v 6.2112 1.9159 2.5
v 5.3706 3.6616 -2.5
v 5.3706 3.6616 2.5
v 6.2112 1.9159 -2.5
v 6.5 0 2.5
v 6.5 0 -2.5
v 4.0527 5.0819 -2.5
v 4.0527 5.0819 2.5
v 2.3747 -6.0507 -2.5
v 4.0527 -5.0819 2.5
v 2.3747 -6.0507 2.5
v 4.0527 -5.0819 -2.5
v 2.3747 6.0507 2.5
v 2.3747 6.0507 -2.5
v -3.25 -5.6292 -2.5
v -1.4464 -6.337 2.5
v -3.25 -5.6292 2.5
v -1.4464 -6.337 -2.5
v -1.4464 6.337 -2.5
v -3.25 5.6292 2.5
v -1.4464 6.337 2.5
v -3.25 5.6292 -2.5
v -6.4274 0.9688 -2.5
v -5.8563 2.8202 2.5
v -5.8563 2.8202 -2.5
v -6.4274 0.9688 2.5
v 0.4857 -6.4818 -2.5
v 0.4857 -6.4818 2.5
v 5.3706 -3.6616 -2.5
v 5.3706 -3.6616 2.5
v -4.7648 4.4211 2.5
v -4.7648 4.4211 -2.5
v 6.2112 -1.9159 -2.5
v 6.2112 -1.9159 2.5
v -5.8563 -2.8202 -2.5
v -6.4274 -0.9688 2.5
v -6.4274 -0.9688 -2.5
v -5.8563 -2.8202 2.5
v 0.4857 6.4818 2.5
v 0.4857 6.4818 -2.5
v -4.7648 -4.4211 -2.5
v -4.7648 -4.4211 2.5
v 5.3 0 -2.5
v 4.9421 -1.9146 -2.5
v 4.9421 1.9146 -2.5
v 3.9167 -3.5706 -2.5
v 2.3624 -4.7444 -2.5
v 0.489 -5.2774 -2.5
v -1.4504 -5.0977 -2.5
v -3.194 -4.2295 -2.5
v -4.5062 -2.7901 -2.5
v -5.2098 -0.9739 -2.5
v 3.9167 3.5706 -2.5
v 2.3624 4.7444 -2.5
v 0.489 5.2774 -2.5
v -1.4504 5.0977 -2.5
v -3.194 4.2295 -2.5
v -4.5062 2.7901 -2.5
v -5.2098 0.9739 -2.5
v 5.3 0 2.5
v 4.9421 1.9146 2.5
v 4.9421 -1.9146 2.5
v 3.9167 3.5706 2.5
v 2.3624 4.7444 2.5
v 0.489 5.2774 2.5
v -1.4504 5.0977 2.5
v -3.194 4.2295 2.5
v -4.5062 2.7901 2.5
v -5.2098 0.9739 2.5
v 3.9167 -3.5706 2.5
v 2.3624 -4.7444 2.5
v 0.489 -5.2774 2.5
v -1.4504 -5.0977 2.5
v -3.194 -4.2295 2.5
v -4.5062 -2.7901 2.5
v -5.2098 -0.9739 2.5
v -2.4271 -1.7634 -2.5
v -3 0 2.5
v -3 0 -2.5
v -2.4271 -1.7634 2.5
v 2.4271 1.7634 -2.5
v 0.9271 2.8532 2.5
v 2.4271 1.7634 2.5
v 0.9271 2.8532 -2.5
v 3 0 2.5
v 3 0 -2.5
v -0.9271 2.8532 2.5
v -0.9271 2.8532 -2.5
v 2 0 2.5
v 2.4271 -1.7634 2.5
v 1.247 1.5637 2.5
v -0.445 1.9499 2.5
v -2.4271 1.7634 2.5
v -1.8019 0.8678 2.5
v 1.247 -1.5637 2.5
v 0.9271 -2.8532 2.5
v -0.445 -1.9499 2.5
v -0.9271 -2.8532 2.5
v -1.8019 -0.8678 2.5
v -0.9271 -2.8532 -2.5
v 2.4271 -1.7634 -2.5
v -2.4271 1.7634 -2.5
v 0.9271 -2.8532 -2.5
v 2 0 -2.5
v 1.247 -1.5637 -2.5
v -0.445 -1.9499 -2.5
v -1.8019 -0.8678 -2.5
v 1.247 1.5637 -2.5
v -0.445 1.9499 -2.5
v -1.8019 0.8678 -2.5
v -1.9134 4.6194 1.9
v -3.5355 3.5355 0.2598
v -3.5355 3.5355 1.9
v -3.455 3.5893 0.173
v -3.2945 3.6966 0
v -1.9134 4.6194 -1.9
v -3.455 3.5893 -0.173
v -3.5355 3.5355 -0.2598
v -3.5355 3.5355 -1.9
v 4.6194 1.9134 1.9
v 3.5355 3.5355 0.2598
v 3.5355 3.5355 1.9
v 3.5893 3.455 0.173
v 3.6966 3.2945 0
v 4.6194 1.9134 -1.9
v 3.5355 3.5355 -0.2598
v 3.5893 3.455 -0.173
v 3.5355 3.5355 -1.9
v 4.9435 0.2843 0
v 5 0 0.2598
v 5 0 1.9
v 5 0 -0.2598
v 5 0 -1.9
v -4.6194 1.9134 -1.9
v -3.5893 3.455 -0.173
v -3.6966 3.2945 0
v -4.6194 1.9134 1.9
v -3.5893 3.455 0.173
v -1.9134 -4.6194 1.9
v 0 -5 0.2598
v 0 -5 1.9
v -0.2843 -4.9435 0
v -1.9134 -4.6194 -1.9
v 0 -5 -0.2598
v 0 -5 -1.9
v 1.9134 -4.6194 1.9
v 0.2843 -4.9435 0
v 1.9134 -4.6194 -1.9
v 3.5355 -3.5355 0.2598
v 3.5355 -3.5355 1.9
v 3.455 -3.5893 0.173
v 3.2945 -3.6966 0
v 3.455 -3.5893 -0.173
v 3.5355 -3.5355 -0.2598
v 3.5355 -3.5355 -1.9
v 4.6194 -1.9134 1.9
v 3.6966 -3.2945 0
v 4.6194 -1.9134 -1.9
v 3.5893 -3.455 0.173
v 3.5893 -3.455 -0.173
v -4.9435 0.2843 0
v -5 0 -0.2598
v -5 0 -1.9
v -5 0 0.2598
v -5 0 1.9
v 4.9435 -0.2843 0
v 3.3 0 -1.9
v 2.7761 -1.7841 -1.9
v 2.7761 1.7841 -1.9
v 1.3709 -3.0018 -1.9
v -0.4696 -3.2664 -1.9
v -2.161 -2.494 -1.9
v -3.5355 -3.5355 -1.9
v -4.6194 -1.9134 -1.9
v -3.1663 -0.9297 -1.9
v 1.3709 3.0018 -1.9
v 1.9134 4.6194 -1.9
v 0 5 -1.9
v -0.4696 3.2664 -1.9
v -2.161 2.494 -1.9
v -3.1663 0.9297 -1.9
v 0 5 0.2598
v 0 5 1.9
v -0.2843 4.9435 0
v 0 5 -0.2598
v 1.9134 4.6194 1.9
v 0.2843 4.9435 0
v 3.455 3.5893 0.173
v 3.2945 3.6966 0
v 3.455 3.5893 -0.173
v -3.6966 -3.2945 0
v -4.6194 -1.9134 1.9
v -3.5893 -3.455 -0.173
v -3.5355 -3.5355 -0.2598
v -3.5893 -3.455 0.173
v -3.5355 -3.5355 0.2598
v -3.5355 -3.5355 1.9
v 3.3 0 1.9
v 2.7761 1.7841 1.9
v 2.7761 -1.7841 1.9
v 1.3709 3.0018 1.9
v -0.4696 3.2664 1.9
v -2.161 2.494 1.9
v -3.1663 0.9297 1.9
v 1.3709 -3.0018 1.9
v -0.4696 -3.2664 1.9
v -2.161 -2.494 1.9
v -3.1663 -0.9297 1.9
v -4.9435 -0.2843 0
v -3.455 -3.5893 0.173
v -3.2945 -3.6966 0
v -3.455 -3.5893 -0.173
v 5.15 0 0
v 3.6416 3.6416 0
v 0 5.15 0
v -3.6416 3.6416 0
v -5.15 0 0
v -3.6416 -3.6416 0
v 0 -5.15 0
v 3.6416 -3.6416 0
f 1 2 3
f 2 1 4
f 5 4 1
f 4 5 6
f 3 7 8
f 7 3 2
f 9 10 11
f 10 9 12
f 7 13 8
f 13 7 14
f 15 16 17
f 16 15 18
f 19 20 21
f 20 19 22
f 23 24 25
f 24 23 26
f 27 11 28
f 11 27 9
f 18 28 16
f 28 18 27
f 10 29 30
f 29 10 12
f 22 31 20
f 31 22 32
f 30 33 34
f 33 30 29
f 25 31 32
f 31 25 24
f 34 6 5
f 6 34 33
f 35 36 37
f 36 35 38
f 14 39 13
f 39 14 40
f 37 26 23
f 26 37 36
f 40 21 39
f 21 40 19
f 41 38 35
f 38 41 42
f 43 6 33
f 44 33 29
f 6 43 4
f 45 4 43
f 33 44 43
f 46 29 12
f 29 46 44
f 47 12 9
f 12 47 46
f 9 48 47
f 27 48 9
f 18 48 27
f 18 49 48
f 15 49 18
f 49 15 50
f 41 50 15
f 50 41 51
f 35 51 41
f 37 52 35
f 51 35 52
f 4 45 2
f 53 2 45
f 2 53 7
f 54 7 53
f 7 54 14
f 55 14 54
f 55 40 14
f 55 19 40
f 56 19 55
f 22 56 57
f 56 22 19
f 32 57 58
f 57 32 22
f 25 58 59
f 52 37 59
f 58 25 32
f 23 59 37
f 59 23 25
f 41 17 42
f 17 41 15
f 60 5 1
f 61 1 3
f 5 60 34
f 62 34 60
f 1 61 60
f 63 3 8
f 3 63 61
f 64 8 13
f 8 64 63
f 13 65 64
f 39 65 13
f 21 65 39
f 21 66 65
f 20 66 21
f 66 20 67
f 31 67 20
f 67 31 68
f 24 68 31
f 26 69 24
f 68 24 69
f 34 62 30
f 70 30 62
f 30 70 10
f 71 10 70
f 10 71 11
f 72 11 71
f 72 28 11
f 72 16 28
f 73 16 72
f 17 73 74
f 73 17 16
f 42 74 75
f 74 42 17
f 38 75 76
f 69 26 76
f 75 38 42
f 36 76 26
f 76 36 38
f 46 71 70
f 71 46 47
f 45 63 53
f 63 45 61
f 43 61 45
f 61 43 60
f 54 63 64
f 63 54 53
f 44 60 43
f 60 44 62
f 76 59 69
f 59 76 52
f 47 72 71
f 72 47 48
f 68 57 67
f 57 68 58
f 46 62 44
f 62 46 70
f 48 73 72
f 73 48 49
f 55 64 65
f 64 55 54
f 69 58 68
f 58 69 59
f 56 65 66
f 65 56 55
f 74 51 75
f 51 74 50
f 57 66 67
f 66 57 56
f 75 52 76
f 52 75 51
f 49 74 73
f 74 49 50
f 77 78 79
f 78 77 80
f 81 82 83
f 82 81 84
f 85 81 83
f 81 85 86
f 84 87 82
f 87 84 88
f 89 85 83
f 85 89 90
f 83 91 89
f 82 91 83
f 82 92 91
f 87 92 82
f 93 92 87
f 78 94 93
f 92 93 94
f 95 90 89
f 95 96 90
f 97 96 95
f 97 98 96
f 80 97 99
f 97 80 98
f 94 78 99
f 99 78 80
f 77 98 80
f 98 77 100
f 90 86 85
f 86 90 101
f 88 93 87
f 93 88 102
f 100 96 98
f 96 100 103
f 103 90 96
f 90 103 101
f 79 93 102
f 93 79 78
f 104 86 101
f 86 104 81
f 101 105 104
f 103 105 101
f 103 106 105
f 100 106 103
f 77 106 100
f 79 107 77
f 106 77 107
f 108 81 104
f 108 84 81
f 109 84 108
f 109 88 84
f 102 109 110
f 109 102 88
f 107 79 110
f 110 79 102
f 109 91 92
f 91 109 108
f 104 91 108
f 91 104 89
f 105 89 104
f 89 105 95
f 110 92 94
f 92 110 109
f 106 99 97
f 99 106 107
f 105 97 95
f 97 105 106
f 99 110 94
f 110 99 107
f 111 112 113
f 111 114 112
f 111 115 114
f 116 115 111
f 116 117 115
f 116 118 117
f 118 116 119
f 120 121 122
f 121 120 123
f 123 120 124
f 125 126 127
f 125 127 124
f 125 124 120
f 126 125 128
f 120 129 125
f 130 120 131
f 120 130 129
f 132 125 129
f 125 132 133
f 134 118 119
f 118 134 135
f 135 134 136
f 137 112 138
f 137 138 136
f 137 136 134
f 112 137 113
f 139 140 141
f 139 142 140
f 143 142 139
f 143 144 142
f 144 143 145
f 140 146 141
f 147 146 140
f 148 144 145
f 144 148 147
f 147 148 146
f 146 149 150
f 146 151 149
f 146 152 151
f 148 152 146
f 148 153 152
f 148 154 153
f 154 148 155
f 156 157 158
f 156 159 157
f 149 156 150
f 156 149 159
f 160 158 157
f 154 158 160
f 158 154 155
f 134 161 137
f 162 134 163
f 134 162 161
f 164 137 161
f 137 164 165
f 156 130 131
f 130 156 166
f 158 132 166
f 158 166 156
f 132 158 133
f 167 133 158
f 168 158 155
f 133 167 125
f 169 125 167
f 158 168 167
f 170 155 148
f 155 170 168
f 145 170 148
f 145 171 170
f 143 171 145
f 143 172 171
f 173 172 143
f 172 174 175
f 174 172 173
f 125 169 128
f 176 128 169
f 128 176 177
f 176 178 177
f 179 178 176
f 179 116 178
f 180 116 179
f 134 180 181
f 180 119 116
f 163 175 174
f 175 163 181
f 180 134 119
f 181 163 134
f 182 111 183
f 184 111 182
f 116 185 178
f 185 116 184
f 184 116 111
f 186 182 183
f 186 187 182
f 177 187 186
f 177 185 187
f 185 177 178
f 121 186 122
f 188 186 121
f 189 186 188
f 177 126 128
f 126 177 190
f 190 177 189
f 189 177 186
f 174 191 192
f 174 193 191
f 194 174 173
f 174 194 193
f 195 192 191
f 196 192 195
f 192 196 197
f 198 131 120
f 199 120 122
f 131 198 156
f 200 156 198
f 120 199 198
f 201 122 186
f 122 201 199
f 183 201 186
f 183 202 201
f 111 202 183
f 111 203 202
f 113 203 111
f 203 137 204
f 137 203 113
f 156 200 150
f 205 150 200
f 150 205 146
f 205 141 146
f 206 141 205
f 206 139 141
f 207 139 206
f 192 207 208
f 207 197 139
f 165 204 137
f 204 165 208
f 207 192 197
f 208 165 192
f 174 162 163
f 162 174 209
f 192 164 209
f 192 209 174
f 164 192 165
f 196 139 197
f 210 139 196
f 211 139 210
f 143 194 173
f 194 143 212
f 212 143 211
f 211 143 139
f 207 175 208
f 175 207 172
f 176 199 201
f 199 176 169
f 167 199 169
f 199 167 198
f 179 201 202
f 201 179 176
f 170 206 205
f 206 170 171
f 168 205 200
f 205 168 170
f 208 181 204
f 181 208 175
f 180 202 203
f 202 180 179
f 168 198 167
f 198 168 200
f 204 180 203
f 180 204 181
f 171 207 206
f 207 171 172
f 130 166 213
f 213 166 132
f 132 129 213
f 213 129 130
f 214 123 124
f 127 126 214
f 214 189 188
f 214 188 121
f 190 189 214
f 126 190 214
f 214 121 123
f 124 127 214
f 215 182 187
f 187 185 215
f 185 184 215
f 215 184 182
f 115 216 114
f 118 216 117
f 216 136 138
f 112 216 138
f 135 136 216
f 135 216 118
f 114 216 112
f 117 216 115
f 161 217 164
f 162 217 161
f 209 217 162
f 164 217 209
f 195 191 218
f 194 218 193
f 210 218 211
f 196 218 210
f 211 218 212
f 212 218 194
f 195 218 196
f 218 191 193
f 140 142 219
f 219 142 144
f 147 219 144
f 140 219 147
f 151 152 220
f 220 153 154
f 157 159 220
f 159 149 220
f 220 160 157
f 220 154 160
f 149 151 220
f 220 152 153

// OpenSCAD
// Parameters
bore_diameter_mm = 4.0; //[2.0:8.0:0.1]
outer_diameter_mm = 13.0; //[6.5:26.0:0.1]
width_mm = 5.0; //[2.5:10.0:0.1]
flange_diameter_mm = 0.0; //[0.0:26.0:0.1]
flange_width_mm = 0.0; //[0.0:5.0:0.1]
eps_mm = 0.6; //[0.2:2.0:0.1]
outer_rim_radial_mm = 1.2; //[0.6:2.4:0.1]
inner_rim_radial_mm = 1.0; //[0.5:2.0:0.1]
annulus_clearance_mm = 0.3; //[0.1:0.8:0.05]
annulus_axial_margin_mm = 0.6; //[0.2:1.5:0.1]
ball_diameter_mm = 2.0; //[1.0:3.5:0.1]
ball_count = 8; //[6:12:1]

// Ball Bearing - complete geometry
module ball_bearing() {
  color("Silver") {
    // Outer Ring
    difference() {
      cylinder(r=outer_diameter_mm/2, h=width_mm, center=true);
      cylinder(r=outer_diameter_mm/2 - outer_rim_radial_mm, h=width_mm + 2*eps_mm, center=true);
    }
    // Inner Ring
    difference() {
      cylinder(r=bore_diameter_mm/2 + inner_rim_radial_mm, h=width_mm, center=true);
      cylinder(r=bore_diameter_mm/2, h=width_mm + 2*eps_mm, center=true);
    }
    // Annulus
    difference() {
      cylinder(r=(outer_diameter_mm/2 - outer_rim_radial_mm) - annulus_clearance_mm, h=width_mm - 2*annulus_axial_margin_mm, center=true);
      cylinder(r=(bore_diameter_mm/2 + inner_rim_radial_mm) + annulus_clearance_mm, h=(width_mm - 2*annulus_axial_margin_mm) + 2*eps_mm, center=true);
    }
    // Optional Flange
    if (flange_diameter_mm > 0 && flange_width_mm > 0) {
      difference() {
        translate([0, 0, width_mm/2 - flange_width_mm/2])
          cylinder(r=flange_diameter_mm/2, h=flange_width_mm, center=true);
        translate([0, 0, width_mm/2 - flange_width_mm/2])
          cylinder(r=outer_diameter_mm/2 - outer_rim_radial_mm, h=flange_width_mm + 2*eps_mm, center=true);
      }
    }
  }
}

// Bearing Ball - complete geometry
module bearing_ball() {
  color("DimGray") {
    for (i = [0:ball_count-1]) {
      rotate([0, 0, i*360/ball_count])
        translate([((bore_diameter_mm/2 + inner_rim_radial_mm) + (outer_diameter_mm/2 - outer_rim_radial_mm))/2, 0, 0])
          sphere(r=ball_diameter_mm/2);
    }
  }
}

// Assembly
module assembly() {
  ball_bearing();
  bearing_ball();
}

assembly();
